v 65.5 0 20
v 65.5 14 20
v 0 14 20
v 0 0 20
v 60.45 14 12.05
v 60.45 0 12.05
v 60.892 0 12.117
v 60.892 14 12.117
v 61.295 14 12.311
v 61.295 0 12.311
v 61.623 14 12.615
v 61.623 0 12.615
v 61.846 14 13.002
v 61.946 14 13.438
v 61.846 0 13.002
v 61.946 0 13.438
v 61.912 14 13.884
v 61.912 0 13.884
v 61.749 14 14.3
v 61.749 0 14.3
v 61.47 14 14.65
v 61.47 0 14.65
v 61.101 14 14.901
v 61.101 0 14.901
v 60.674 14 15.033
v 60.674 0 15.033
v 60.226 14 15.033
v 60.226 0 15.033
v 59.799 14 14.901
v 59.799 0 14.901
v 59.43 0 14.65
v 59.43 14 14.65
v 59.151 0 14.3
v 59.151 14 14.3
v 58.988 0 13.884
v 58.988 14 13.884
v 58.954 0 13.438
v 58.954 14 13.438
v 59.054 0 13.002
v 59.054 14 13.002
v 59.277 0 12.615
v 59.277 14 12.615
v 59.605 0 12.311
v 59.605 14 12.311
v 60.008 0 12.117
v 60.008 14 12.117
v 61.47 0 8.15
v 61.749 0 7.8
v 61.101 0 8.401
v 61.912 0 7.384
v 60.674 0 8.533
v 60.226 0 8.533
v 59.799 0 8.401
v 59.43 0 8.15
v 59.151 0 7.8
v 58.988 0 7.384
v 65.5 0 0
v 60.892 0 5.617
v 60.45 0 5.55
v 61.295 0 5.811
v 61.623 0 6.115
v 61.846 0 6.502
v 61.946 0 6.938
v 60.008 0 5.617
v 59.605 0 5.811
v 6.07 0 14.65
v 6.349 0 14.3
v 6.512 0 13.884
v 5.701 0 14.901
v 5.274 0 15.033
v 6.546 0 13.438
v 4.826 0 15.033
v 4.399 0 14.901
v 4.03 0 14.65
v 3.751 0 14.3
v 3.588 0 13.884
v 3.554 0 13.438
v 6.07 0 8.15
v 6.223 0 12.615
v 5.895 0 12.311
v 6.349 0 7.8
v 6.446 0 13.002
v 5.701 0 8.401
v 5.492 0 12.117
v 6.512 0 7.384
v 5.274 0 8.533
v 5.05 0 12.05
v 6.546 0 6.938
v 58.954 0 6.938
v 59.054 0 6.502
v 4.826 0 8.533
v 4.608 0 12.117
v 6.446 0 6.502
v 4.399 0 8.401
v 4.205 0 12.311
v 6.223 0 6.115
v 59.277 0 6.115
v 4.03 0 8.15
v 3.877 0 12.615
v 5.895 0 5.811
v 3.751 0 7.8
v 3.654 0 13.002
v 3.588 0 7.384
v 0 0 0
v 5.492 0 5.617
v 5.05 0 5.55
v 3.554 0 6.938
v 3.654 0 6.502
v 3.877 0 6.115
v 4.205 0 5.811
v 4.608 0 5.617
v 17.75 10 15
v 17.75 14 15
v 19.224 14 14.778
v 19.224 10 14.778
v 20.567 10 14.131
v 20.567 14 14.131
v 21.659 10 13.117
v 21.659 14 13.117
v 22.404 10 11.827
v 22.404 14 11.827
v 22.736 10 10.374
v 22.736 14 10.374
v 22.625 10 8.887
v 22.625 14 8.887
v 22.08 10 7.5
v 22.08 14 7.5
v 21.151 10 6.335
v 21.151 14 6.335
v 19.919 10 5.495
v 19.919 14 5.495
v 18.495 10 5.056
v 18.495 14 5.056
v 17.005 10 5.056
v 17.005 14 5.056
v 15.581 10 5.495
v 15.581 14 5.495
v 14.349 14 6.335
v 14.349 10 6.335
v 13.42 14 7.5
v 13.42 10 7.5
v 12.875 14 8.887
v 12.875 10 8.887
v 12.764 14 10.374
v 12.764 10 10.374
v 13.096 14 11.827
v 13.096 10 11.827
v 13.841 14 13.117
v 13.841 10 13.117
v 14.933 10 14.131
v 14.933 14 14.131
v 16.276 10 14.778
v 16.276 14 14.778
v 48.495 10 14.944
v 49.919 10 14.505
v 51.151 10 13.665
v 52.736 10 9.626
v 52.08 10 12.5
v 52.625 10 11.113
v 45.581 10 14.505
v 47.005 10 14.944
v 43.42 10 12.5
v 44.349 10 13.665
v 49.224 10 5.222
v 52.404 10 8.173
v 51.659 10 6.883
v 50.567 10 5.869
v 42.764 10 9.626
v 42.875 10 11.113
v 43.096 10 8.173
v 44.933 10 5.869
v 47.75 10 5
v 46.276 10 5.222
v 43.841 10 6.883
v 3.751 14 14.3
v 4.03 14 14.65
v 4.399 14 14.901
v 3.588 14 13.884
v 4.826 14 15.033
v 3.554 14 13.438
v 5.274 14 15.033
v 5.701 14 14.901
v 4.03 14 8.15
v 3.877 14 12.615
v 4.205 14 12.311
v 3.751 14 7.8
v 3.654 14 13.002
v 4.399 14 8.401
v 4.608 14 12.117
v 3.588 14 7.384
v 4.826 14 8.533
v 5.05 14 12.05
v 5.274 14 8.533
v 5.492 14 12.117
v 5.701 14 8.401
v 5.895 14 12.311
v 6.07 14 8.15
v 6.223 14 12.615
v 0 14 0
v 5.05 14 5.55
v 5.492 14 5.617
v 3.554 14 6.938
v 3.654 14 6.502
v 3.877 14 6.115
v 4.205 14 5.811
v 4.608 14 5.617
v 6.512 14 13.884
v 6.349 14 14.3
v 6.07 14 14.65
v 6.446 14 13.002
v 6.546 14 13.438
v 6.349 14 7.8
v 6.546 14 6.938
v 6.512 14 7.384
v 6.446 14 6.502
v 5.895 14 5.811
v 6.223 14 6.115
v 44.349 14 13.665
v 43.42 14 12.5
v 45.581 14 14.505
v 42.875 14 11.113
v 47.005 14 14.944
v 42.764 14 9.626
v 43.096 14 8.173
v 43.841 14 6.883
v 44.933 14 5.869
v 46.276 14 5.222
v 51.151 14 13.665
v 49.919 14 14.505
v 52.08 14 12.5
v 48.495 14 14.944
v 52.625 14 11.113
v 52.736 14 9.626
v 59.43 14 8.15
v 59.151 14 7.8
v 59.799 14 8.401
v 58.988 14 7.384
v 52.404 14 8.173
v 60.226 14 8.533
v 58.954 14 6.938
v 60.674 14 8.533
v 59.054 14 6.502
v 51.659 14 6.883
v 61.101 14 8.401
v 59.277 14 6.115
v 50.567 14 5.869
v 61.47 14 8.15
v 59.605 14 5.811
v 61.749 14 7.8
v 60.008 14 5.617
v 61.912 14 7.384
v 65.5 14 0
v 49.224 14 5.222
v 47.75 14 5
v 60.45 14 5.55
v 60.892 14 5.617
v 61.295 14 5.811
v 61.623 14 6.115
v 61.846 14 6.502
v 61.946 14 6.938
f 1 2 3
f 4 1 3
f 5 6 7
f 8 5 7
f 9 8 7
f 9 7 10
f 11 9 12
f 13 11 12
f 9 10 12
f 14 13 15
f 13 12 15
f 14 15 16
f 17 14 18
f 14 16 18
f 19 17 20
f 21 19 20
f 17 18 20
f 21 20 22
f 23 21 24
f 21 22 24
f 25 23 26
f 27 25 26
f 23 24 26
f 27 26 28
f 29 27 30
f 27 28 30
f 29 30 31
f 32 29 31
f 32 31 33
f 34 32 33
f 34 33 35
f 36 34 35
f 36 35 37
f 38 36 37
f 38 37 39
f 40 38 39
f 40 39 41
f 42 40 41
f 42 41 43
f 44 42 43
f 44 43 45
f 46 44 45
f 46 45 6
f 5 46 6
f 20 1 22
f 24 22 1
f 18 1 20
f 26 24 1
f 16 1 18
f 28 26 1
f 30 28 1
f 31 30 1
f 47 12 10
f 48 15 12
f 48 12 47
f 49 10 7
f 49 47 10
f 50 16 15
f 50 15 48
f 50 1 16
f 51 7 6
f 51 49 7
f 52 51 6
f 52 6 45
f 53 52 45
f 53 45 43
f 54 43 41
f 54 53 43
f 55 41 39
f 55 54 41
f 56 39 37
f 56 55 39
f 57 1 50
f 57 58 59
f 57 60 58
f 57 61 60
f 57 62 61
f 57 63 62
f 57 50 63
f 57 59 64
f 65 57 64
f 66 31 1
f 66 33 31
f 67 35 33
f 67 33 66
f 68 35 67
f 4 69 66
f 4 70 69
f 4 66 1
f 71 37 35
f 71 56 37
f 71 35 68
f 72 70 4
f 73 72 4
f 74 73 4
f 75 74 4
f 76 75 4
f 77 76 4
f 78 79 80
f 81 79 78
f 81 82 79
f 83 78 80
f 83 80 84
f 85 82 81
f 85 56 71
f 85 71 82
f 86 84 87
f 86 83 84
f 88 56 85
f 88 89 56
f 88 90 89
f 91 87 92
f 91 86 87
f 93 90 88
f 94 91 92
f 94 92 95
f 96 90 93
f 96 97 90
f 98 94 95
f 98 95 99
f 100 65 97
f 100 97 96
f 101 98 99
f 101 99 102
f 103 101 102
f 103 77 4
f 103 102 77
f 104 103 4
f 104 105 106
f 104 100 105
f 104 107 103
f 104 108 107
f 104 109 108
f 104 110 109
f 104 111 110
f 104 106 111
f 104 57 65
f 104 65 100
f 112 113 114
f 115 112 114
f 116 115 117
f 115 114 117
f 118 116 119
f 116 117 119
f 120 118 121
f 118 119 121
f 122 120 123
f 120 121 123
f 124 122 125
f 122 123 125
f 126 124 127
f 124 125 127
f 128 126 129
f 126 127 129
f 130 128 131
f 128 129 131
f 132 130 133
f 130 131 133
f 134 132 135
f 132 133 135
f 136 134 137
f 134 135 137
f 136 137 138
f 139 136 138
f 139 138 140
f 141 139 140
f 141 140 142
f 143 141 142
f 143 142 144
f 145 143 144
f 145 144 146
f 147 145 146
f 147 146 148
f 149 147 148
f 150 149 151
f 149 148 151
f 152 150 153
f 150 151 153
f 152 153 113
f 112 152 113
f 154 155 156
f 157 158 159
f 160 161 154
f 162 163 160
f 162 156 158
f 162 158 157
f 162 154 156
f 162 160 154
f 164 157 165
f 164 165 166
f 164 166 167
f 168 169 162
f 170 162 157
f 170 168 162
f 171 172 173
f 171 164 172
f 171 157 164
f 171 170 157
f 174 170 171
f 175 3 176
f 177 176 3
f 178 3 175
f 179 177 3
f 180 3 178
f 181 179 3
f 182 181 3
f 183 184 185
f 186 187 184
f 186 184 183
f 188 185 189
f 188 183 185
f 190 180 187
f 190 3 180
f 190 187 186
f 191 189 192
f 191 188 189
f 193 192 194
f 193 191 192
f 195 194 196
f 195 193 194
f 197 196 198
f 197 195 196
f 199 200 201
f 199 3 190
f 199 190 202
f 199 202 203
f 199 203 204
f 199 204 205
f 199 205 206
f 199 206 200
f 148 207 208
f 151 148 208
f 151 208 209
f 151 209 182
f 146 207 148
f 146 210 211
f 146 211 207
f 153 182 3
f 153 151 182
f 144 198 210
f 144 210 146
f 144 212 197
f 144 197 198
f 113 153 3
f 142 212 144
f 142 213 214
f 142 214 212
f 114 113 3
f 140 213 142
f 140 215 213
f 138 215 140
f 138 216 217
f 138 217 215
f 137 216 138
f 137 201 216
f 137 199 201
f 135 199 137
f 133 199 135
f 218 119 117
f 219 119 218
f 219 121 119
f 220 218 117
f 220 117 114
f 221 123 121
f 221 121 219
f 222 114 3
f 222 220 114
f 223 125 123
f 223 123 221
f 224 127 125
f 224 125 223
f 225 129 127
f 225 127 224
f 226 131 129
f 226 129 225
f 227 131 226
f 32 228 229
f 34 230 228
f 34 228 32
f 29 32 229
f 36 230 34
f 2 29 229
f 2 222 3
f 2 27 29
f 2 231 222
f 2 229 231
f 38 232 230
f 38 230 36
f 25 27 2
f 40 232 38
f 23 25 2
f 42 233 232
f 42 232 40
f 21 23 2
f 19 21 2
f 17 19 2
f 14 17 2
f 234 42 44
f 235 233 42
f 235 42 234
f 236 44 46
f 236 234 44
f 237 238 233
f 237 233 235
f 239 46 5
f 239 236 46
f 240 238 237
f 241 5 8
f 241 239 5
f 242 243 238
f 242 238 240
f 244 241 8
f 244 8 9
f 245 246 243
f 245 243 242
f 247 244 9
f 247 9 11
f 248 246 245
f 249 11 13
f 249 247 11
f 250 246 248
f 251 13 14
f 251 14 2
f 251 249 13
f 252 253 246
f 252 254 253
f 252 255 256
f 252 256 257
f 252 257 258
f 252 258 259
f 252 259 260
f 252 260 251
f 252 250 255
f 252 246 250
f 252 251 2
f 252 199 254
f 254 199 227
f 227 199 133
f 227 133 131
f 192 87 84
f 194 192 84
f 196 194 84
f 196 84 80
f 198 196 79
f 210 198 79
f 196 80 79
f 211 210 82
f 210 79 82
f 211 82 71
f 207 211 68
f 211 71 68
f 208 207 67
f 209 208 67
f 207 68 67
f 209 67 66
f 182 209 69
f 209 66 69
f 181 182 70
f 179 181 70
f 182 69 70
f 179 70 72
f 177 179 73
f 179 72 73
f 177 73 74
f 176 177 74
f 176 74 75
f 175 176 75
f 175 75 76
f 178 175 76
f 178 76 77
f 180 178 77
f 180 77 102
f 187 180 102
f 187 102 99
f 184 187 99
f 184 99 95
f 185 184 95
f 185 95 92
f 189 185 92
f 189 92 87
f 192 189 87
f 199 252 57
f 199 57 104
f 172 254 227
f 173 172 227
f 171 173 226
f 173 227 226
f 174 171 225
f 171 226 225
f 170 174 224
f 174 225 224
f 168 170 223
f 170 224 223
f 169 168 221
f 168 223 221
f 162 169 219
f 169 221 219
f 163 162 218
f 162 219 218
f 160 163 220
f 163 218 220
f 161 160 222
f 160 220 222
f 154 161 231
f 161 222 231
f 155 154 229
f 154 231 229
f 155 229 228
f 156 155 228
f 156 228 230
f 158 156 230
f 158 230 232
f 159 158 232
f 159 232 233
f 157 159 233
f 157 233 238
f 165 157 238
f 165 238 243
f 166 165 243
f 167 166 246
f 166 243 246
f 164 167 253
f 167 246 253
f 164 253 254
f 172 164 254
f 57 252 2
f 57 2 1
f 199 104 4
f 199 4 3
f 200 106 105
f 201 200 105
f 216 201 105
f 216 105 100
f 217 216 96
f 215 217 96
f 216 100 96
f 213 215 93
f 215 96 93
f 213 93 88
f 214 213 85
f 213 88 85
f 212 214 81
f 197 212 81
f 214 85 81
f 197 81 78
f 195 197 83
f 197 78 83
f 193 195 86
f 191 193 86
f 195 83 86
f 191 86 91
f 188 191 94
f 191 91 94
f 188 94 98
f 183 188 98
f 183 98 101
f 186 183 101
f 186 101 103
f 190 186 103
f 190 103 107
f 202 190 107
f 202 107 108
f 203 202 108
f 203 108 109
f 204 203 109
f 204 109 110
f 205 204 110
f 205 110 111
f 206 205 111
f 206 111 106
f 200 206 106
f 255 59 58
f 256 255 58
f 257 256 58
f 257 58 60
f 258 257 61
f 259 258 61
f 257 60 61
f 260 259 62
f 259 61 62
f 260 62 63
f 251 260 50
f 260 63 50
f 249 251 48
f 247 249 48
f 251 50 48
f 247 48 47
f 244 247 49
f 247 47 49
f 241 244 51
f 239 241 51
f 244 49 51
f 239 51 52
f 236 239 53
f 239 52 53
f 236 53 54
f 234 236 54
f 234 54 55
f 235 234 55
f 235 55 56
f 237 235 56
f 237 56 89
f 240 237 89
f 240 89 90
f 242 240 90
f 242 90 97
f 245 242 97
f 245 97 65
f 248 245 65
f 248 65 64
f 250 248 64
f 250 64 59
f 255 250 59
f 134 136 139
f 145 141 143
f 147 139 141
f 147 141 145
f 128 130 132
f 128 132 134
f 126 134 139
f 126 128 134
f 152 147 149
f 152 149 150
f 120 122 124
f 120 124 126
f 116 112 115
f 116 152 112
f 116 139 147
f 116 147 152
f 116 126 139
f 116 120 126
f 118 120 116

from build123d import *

# Parameters (mm, degrees)
BOSS_EXTRUDE1_DEPTH = 20
SKETCH14_W          = 65.5
SKETCH14_H          = 14
BOSS_EXTRUDE2_DEPTH = 20
SKETCH13_R          = 1.5
CUT_EXTRUDE2_DEPTH  = 54
SKETCH12_R          = 5
CUT_EXTRUDE3_DEPTH  = 4


with BuildPart() as part:
    # Sketch1 → Boss-Extrude1 (new body)
    with BuildSketch(Plane.XY):
        Polygon((26.75, 14), (26.75, 6), (38.75, 6), (38.75, 14), (65.5, 14), (65.5, 0), (0, 0), (0, 14), align=None)
    extrude(amount=BOSS_EXTRUDE1_DEPTH)

    # Sketch14 → Boss-Extrude2 (add)
    with BuildSketch(Plane.XY):
        with Locations((32.75, 7)):
            Rectangle(SKETCH14_W, SKETCH14_H)
    extrude(amount=BOSS_EXTRUDE2_DEPTH)

    # Sketch13 → Cut-Extrude2 (cut)
    with BuildSketch(Plane.XZ):
        with Locations(Location((5.05, 7.05, 0), (0, 0, 270))):
            Circle(SKETCH13_R)
        with Locations(Location((5.05, 13.55, 0), (0, 0, 270))):
            Circle(SKETCH13_R)
        with Locations(Location((60.45, 7.05, 0), (0, 0, 270))):
            Circle(SKETCH13_R)
        with Locations(Location((60.45, 13.55, 0), (0, 0, 270))):
            Circle(SKETCH13_R)
    extrude(amount=-CUT_EXTRUDE2_DEPTH, mode=Mode.SUBTRACT)

    # Sketch12 → Cut-Extrude3 (cut)
    with BuildSketch(Plane(origin=(0, 14, 0), x_dir=(1, 0, 0), z_dir=(0, 1, 0))):
        with Locations(Location((17.75, -10, 0), (0, 0, 270))):
            Circle(SKETCH12_R)
        with Locations(Location((47.75, -10, 0), (0, 0, 90))):
            Circle(SKETCH12_R)
    extrude(amount=-CUT_EXTRUDE3_DEPTH, mode=Mode.SUBTRACT)


solid = part.part
